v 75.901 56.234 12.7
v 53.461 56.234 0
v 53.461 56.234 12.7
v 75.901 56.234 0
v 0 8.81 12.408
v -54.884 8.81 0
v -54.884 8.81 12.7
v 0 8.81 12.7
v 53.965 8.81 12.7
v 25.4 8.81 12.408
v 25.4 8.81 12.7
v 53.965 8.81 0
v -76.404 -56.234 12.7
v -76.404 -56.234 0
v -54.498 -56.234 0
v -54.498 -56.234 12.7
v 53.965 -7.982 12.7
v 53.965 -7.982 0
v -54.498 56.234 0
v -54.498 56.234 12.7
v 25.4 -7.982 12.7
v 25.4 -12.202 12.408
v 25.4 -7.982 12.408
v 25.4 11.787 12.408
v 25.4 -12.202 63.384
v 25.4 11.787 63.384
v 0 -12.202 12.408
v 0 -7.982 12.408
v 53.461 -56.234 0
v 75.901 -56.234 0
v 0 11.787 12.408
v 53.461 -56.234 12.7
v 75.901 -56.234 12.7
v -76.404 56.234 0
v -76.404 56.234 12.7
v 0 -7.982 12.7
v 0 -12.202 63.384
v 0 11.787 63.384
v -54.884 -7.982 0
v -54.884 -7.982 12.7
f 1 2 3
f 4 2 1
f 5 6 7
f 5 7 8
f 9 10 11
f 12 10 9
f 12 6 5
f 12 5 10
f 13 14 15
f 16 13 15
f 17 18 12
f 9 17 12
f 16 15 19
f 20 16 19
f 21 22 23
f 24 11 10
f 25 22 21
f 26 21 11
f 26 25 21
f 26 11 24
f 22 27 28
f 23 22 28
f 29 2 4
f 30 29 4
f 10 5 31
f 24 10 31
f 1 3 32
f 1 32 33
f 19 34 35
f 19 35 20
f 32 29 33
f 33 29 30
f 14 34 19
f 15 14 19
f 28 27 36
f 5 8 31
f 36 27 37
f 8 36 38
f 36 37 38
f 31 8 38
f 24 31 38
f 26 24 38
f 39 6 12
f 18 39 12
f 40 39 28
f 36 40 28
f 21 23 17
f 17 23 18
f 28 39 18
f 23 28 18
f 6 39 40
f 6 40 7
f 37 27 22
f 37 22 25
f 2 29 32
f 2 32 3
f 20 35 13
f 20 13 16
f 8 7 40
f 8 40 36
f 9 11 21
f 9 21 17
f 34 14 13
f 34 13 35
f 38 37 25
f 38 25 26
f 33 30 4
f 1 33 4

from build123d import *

# Parameters (mm, degrees)
F0_W     = 21.905907
F0_H     = 112.468146
F0_W_2   = 22.440206
F1_DEPTH = 12.7
F2_W     = 108.849324
F2_H     = 16.792183
F3_DEPTH = 12.7
F4_W     = 23.988836
F4_H     = 50.976265
F5_DEPTH = 25.4


with BuildPart() as f1:
    # F0 (on Top) → F1 (new body)
    with BuildSketch(Plane.XY):
        with Locations((-65.450582, 0)):
            Rectangle(F0_W, F0_H)
        with Locations((64.680951, 0)):
            Rectangle(F0_W_2, F0_H)
    extrude(amount=F1_DEPTH)


with BuildPart() as f3:
    # F2 (on Top) → F3 (new body)
    with BuildSketch(Plane.XY):
        with Locations((-0.459276, 0.413755)):
            Rectangle(F2_W, F2_H)
    extrude(amount=F3_DEPTH)

    # F4 (on Right) → F5 (join)
    with BuildSketch(Plane.YZ):
        with Locations((-0.207577, 37.896303)):
            Rectangle(F4_W, F4_H)
    extrude(amount=F5_DEPTH)


solid = Compound([f1.part, f3.part])
